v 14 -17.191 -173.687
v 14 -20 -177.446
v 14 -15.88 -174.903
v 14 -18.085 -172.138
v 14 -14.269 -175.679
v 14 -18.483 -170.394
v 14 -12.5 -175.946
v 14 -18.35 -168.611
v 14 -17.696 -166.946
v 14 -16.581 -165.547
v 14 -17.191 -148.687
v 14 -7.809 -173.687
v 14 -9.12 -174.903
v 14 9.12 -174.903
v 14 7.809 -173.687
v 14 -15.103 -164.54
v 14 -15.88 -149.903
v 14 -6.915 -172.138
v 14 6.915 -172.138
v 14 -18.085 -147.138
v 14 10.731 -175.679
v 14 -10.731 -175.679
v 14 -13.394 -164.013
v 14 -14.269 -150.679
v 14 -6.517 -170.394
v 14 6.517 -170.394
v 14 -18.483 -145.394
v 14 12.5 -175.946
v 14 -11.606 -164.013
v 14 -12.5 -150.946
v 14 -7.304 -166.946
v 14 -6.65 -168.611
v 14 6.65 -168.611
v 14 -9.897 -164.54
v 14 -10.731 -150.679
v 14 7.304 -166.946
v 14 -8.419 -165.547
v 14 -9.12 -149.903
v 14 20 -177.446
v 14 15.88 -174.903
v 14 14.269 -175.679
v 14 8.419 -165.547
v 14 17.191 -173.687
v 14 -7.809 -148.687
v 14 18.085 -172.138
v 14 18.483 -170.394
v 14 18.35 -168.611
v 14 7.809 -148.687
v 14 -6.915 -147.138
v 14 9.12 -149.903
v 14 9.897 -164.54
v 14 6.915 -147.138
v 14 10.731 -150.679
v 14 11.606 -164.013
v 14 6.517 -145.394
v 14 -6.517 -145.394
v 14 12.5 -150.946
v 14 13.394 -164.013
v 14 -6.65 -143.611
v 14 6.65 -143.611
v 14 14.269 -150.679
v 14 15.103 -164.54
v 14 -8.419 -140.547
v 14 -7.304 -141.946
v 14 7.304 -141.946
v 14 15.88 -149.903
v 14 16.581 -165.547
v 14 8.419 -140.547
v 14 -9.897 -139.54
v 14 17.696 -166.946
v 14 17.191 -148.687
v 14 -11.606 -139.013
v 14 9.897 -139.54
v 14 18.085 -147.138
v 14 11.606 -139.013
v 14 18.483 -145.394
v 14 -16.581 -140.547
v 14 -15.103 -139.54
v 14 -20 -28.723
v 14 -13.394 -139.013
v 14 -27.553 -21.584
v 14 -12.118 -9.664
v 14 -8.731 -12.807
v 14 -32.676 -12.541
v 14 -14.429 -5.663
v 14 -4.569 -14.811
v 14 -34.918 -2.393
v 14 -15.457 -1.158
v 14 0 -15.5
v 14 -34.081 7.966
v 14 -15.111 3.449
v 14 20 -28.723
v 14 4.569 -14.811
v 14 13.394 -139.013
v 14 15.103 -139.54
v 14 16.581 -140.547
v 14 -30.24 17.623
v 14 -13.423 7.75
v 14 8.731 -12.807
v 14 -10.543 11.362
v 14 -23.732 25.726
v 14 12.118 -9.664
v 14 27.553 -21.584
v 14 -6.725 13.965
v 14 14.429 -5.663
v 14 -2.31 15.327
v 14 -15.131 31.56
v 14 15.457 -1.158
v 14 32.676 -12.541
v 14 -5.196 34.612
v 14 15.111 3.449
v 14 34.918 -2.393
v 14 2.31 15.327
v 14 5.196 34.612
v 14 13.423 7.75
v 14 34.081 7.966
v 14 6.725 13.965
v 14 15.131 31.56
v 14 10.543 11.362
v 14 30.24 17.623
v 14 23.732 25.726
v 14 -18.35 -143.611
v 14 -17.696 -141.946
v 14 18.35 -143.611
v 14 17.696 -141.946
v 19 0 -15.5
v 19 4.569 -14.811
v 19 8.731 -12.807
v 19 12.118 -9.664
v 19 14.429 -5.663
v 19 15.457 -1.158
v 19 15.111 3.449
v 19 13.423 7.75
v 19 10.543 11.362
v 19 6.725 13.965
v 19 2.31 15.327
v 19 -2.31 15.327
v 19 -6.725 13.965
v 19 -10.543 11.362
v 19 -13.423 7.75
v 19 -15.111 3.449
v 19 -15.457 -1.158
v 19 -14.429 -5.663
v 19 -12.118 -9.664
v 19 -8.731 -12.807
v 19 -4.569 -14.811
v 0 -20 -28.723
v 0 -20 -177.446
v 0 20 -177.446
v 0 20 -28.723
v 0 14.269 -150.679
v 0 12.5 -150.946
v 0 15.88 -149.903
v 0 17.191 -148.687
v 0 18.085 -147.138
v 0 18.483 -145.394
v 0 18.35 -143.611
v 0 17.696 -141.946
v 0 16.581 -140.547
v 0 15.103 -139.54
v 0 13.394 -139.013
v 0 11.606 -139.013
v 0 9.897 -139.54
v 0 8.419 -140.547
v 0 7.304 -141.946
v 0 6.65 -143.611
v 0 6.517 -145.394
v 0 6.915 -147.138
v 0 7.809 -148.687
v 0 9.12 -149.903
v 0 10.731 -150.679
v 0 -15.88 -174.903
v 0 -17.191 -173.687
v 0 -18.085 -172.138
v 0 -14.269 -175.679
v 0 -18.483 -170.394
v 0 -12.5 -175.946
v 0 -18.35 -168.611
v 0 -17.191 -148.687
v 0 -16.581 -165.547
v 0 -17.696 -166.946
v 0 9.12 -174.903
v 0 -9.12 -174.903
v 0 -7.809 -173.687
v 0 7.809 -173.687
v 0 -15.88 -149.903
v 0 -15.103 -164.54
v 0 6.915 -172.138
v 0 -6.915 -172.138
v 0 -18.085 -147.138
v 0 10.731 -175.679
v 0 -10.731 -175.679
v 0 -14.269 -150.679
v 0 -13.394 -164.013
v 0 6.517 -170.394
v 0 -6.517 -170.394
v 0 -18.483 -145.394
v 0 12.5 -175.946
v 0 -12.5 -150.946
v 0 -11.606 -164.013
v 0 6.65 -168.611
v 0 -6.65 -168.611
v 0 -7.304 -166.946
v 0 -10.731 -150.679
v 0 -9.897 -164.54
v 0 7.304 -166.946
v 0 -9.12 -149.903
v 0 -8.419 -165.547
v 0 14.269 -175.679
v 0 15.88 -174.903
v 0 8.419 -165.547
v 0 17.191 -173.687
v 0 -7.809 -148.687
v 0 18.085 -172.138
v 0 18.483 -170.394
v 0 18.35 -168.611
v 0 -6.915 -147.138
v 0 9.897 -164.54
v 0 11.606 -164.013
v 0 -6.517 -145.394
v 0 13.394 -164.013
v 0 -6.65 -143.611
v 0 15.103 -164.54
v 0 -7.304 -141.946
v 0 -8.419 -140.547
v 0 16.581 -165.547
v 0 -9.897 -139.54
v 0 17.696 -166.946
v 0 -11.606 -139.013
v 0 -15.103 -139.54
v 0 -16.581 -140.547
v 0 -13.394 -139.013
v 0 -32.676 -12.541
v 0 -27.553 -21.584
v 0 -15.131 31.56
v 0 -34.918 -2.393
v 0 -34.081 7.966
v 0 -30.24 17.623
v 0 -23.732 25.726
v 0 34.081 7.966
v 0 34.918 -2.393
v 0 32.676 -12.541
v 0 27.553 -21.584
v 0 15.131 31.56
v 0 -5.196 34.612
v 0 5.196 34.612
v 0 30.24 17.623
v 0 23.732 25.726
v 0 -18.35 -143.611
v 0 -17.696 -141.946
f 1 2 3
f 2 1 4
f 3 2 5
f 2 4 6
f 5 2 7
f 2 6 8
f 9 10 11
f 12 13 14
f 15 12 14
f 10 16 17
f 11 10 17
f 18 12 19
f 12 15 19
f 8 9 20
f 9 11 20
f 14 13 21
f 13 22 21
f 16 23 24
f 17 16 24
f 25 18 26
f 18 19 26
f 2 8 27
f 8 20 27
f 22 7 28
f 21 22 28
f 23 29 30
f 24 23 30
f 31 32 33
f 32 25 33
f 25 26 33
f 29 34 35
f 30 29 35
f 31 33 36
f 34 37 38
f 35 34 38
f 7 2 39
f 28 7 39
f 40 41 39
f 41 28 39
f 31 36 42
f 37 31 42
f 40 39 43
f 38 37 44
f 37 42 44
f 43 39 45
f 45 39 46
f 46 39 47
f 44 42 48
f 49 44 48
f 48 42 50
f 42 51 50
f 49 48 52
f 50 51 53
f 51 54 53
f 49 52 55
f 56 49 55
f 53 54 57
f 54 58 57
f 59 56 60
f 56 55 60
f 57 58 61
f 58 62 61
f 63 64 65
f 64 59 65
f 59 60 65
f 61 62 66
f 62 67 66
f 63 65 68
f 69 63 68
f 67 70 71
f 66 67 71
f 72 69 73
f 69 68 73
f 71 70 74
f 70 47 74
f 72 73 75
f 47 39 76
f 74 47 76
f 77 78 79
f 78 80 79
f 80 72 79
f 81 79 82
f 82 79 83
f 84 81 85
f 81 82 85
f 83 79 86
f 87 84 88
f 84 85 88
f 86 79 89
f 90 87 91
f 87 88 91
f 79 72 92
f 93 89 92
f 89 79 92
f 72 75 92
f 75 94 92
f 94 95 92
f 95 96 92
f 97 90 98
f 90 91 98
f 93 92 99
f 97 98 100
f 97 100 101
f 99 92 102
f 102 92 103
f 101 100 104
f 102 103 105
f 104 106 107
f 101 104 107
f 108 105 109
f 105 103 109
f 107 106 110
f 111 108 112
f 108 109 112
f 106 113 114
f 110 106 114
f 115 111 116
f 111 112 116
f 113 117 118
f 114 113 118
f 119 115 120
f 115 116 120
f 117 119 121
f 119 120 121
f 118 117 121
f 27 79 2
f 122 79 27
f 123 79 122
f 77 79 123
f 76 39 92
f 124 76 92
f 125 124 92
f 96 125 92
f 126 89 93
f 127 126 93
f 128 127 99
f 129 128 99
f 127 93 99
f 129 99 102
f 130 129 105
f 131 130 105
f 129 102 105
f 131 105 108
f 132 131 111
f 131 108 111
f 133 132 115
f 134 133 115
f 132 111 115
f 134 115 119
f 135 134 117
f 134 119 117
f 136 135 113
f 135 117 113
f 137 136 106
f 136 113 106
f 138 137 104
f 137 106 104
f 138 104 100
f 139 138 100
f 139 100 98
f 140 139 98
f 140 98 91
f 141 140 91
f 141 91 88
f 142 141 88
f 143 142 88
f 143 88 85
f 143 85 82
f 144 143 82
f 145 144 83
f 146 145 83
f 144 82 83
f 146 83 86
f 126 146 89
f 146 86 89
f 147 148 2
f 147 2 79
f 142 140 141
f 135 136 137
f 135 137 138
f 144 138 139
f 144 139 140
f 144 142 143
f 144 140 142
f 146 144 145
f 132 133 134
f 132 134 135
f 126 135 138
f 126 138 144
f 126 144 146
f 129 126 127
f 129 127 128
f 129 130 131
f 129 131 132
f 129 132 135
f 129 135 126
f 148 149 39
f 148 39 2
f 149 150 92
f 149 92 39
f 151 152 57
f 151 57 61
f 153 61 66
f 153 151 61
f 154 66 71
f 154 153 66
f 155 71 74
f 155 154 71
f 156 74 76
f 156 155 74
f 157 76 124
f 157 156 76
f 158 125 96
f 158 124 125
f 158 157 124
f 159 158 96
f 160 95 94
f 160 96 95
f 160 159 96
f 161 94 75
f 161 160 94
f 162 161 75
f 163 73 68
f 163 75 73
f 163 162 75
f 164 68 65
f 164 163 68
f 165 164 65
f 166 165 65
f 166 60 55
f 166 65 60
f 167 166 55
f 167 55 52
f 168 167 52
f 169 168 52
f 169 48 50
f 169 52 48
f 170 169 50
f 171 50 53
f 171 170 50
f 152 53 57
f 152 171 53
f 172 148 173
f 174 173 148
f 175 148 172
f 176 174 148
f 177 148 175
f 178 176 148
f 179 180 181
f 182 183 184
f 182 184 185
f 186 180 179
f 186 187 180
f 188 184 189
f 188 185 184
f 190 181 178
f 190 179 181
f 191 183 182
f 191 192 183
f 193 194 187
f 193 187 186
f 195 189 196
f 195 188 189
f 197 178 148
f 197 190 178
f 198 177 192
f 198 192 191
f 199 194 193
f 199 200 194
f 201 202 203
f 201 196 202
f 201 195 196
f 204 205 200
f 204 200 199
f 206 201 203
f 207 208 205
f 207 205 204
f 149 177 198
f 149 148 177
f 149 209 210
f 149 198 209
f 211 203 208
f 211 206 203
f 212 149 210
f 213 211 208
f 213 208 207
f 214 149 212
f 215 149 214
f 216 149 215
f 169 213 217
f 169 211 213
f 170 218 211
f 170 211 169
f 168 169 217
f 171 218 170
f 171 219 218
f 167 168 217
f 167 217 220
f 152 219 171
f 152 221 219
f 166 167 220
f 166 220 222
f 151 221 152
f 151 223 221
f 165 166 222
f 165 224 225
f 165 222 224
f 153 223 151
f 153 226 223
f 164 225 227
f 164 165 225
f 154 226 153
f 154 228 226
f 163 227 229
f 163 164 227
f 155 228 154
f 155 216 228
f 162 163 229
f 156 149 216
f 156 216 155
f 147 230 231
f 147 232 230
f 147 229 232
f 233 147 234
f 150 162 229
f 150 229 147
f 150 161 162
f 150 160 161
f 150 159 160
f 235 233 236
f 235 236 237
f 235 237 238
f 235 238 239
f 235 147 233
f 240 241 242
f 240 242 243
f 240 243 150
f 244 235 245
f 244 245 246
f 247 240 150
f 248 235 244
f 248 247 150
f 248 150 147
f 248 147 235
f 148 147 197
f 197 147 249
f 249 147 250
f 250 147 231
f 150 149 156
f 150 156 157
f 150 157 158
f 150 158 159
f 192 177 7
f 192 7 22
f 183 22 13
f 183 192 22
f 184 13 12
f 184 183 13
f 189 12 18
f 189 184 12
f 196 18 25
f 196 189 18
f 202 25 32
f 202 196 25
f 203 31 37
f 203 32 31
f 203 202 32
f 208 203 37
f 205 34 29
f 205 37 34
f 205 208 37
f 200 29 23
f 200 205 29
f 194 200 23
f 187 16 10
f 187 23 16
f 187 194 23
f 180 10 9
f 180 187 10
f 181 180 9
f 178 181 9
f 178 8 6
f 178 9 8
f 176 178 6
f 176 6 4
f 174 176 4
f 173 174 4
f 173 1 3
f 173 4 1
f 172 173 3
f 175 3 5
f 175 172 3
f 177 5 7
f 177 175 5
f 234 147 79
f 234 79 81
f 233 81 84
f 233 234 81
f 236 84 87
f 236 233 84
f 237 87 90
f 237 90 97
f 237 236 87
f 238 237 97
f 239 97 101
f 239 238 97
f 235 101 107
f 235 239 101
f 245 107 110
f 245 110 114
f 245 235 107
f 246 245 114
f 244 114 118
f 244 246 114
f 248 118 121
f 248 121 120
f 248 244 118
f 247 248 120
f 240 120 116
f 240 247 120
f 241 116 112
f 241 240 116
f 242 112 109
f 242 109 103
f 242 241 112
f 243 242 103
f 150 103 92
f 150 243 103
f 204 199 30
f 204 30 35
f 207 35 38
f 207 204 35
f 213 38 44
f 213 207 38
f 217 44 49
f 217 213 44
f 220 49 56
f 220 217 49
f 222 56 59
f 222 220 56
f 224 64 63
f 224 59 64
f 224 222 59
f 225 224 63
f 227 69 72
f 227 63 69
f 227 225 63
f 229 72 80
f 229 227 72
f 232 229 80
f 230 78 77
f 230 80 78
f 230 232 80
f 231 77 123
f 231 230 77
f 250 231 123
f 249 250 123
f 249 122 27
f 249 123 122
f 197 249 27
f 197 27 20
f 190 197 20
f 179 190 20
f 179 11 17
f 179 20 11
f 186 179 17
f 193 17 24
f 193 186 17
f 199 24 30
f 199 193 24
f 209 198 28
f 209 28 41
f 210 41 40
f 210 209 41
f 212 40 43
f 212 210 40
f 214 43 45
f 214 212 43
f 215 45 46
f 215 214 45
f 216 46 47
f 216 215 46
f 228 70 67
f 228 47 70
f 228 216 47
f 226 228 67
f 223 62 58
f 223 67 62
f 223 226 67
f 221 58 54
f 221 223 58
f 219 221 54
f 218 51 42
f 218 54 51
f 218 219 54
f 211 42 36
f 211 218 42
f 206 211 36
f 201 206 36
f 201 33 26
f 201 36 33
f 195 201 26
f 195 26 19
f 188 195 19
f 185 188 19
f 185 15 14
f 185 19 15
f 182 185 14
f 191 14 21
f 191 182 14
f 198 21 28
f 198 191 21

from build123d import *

# Parameters (mm, degrees)
EXTRUDE_1_DEPTH          = 14
SKETCH_4_R               = 15.5
EXTRUDE_2_DEPTH          = 5
CUT_EXTRUDE_1_DEPTH      = 182.405486002
CUT_EXTRUDE_1_DEPTH_BACK = 182.405486002
SKETCH_5_R               = 6


with BuildPart() as part:
    # 草图1 → 凸台-拉伸1 (new body)
    with BuildSketch(Plane(origin=(0, 0, 0), x_dir=(0, 0, -1), z_dir=(1, 0, 0))):
        with BuildLine():
            Line((177.445626465, -20), (28.722813233, -20))
            ThreePointArc((28.722813233, -20), (-35, 0), (28.722813233, 20))
            Line((28.722813233, 20), (177.445626465, 20))
            Line((177.445626465, 20), (177.445626465, -20))
        make_face()
    extrude(amount=EXTRUDE_1_DEPTH)

    # 草图4 → 凸台-拉伸2 (add)
    with BuildSketch(Plane(origin=(14, 0, 0), x_dir=(0, 0, -1), z_dir=(1, 0, 0))):
        Circle(SKETCH_4_R)
    extrude(amount=EXTRUDE_2_DEPTH)

    # 草图5 → 切除-拉伸1 (cut, two sides: drawn at the far end of the back side and taken through both)
    with BuildSketch(Plane(origin=(14, 0, 0), x_dir=(0, 0, -1), z_dir=(1, 0, 0)).offset(-CUT_EXTRUDE_1_DEPTH_BACK)):
        with Locations((169.945626465, 12.5)):
            Circle(SKETCH_5_R)
        with Locations((144.945626465, 12.5)):
            Circle(SKETCH_5_R)
        with Locations((144.945626465, -12.5)):
            Circle(SKETCH_5_R)
        with Locations((169.945626465, -12.5)):
            Circle(SKETCH_5_R)
    extrude(amount=CUT_EXTRUDE_1_DEPTH + CUT_EXTRUDE_1_DEPTH_BACK, mode=Mode.SUBTRACT)


solid = part.part
